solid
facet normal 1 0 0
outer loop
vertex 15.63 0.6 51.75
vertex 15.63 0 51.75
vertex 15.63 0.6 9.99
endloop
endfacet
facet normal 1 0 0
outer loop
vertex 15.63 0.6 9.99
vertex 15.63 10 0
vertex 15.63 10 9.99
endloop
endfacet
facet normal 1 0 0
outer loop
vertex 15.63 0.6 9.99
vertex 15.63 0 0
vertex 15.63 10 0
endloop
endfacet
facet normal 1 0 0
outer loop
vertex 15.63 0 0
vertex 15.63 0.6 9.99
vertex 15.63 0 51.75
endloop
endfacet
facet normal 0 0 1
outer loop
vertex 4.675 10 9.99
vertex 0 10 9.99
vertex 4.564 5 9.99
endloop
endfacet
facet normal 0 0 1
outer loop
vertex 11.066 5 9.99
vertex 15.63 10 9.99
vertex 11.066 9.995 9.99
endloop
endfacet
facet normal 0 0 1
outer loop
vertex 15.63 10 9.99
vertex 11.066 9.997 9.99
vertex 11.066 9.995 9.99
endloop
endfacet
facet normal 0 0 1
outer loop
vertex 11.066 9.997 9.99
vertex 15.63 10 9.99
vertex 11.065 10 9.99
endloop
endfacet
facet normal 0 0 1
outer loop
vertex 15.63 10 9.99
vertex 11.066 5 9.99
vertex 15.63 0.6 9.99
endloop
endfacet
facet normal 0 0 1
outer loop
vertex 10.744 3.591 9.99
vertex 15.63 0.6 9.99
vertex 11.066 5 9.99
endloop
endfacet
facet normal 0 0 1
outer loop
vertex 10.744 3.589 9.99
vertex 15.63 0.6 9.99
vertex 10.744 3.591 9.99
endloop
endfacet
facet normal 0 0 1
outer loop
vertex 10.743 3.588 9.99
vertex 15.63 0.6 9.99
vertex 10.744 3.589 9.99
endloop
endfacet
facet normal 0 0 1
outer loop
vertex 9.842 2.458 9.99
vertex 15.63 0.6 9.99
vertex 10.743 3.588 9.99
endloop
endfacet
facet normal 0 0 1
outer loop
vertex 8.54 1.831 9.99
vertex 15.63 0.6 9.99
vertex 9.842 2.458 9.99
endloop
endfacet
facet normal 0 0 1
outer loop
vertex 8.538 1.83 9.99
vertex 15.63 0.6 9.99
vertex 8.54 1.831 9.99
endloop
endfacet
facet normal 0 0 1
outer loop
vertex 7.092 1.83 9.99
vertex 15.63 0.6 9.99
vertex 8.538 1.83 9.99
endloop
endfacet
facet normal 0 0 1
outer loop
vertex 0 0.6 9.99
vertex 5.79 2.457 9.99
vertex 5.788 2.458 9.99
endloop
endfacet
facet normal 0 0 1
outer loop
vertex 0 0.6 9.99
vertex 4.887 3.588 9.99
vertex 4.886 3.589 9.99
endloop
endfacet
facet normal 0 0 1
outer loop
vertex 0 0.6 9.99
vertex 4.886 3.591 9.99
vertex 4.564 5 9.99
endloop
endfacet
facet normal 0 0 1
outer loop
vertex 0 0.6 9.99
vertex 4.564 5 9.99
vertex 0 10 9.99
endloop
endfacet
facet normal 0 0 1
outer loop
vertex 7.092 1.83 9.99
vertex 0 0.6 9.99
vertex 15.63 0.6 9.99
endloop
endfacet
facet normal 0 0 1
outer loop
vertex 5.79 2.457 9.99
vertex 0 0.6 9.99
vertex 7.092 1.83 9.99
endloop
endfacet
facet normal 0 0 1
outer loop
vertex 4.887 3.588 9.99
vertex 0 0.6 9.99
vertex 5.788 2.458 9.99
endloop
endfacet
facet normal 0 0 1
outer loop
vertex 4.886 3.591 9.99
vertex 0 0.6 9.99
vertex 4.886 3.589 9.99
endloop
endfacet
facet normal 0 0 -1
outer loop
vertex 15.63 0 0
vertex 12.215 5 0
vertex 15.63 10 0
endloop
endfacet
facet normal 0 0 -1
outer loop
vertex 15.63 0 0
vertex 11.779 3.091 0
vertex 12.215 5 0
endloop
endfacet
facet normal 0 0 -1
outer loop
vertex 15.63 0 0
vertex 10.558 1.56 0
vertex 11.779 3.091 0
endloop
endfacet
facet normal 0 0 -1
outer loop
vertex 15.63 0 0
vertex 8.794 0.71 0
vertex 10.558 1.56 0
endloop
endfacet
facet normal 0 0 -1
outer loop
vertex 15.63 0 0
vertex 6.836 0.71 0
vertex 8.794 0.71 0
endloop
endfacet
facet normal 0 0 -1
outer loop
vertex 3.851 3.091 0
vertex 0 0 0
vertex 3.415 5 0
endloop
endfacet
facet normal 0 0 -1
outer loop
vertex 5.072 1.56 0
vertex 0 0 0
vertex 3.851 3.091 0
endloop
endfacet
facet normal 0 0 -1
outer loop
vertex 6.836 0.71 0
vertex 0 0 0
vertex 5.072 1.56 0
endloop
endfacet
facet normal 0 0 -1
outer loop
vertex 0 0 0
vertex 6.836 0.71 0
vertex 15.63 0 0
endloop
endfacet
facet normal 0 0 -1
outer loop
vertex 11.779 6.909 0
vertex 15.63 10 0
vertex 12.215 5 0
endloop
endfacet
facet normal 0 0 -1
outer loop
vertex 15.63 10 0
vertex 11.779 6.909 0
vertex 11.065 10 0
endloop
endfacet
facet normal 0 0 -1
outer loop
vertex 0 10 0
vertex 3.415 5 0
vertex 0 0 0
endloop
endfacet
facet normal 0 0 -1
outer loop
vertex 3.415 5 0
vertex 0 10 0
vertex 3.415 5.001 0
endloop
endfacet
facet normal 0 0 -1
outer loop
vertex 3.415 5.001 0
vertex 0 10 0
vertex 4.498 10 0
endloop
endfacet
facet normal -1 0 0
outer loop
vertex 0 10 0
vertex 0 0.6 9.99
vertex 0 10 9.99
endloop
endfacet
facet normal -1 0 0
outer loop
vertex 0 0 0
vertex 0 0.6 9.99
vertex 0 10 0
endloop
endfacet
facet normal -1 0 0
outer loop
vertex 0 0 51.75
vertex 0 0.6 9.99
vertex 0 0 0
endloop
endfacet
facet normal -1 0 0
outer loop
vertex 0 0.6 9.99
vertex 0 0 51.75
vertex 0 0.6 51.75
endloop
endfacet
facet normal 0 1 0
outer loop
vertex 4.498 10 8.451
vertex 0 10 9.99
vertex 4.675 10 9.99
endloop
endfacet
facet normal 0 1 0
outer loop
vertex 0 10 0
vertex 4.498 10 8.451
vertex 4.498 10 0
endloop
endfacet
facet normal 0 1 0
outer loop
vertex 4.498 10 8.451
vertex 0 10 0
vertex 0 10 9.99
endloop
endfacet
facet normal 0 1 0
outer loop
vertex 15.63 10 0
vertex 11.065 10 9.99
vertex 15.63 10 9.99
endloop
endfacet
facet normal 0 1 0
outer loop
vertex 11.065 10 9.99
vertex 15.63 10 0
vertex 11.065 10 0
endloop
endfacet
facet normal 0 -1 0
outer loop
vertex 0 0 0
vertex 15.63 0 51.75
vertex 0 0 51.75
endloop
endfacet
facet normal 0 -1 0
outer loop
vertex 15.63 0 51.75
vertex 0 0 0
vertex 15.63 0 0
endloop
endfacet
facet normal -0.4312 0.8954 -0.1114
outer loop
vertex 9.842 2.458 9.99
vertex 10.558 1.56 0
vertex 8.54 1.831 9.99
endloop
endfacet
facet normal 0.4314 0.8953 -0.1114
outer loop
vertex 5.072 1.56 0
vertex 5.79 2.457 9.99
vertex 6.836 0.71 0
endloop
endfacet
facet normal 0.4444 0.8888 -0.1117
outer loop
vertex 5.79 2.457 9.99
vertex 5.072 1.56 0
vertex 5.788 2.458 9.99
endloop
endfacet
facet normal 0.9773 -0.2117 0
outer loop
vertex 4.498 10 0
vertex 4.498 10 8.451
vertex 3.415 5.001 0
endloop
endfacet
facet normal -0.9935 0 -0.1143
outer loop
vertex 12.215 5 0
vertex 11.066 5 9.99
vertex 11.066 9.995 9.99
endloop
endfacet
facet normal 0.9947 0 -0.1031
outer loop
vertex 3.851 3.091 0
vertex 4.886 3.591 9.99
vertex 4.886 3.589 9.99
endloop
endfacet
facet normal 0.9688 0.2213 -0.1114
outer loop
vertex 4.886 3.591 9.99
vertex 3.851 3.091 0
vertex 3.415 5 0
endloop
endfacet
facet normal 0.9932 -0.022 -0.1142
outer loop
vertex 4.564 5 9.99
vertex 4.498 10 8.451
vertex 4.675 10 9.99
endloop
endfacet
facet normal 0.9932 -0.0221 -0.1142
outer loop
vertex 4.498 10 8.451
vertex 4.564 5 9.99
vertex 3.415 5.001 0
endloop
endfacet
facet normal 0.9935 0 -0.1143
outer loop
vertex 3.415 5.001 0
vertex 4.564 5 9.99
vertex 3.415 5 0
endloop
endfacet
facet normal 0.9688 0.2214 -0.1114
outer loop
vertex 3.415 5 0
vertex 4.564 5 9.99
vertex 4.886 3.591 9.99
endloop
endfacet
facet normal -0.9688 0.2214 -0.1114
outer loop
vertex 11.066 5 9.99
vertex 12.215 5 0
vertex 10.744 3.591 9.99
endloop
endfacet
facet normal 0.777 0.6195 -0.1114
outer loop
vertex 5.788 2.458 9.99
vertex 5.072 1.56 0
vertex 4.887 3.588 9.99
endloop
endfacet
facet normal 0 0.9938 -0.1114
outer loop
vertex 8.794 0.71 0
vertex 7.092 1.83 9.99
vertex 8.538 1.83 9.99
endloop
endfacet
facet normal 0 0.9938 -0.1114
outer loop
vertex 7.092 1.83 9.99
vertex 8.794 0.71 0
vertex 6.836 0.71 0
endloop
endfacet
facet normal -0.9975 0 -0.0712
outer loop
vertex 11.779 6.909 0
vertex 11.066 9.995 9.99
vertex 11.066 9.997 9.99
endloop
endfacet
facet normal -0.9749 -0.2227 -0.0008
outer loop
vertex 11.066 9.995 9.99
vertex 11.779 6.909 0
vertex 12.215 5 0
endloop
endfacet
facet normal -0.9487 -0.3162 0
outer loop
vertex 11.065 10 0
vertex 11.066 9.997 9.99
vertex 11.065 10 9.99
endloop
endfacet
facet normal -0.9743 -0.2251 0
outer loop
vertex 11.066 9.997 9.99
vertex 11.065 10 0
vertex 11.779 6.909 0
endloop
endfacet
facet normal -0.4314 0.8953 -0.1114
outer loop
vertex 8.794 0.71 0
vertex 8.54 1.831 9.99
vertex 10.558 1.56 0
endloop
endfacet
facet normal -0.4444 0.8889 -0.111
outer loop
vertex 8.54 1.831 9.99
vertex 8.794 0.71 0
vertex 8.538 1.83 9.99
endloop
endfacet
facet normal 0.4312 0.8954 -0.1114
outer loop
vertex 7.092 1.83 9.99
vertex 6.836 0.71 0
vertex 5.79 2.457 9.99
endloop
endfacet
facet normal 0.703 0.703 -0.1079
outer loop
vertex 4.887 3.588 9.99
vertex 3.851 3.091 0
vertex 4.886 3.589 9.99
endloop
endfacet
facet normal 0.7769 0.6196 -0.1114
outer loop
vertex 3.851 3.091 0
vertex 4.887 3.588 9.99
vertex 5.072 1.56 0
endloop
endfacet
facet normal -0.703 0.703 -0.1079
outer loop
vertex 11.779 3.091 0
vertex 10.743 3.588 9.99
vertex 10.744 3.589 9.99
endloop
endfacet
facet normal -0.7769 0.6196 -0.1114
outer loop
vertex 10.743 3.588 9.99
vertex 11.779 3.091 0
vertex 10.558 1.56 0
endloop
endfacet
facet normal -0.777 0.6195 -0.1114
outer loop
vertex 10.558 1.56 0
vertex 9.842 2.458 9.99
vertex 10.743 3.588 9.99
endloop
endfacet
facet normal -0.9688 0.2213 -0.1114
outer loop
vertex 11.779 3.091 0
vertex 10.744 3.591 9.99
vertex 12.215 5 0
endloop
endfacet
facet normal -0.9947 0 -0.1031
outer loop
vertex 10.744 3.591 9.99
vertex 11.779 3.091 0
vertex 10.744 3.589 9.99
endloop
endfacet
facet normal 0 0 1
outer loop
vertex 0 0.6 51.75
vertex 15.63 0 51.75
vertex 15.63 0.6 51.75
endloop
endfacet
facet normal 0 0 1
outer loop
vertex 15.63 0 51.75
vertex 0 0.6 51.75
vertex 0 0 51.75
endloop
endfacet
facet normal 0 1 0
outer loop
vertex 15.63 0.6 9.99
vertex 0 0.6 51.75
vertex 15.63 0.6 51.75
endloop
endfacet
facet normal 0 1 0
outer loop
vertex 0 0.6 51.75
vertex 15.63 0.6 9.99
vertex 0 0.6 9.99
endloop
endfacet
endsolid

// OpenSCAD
//$fn=360;
w = 15.63;
d = .6;

module toothbrush() {
    translate([0,d,0]) hull() {
        translate([w/2,8.8/2,-.001]) cylinder(d1=8.8,d2=6.5,h=10);
        translate([w/2,8.8/2+5,-.001]) cylinder(d=6.5,h=10);
    }
}

cube([w,d,51.75]);
difference() {
    cube([w,8.8/2+5+d,10-.01]);
    toothbrush();
}

//#color("grey") toothbrush();
//#color("grey") translate([0,d,0]) translate([w/2,8.8/2+5,-.001]) cylinder(d=6.5,h=10);
